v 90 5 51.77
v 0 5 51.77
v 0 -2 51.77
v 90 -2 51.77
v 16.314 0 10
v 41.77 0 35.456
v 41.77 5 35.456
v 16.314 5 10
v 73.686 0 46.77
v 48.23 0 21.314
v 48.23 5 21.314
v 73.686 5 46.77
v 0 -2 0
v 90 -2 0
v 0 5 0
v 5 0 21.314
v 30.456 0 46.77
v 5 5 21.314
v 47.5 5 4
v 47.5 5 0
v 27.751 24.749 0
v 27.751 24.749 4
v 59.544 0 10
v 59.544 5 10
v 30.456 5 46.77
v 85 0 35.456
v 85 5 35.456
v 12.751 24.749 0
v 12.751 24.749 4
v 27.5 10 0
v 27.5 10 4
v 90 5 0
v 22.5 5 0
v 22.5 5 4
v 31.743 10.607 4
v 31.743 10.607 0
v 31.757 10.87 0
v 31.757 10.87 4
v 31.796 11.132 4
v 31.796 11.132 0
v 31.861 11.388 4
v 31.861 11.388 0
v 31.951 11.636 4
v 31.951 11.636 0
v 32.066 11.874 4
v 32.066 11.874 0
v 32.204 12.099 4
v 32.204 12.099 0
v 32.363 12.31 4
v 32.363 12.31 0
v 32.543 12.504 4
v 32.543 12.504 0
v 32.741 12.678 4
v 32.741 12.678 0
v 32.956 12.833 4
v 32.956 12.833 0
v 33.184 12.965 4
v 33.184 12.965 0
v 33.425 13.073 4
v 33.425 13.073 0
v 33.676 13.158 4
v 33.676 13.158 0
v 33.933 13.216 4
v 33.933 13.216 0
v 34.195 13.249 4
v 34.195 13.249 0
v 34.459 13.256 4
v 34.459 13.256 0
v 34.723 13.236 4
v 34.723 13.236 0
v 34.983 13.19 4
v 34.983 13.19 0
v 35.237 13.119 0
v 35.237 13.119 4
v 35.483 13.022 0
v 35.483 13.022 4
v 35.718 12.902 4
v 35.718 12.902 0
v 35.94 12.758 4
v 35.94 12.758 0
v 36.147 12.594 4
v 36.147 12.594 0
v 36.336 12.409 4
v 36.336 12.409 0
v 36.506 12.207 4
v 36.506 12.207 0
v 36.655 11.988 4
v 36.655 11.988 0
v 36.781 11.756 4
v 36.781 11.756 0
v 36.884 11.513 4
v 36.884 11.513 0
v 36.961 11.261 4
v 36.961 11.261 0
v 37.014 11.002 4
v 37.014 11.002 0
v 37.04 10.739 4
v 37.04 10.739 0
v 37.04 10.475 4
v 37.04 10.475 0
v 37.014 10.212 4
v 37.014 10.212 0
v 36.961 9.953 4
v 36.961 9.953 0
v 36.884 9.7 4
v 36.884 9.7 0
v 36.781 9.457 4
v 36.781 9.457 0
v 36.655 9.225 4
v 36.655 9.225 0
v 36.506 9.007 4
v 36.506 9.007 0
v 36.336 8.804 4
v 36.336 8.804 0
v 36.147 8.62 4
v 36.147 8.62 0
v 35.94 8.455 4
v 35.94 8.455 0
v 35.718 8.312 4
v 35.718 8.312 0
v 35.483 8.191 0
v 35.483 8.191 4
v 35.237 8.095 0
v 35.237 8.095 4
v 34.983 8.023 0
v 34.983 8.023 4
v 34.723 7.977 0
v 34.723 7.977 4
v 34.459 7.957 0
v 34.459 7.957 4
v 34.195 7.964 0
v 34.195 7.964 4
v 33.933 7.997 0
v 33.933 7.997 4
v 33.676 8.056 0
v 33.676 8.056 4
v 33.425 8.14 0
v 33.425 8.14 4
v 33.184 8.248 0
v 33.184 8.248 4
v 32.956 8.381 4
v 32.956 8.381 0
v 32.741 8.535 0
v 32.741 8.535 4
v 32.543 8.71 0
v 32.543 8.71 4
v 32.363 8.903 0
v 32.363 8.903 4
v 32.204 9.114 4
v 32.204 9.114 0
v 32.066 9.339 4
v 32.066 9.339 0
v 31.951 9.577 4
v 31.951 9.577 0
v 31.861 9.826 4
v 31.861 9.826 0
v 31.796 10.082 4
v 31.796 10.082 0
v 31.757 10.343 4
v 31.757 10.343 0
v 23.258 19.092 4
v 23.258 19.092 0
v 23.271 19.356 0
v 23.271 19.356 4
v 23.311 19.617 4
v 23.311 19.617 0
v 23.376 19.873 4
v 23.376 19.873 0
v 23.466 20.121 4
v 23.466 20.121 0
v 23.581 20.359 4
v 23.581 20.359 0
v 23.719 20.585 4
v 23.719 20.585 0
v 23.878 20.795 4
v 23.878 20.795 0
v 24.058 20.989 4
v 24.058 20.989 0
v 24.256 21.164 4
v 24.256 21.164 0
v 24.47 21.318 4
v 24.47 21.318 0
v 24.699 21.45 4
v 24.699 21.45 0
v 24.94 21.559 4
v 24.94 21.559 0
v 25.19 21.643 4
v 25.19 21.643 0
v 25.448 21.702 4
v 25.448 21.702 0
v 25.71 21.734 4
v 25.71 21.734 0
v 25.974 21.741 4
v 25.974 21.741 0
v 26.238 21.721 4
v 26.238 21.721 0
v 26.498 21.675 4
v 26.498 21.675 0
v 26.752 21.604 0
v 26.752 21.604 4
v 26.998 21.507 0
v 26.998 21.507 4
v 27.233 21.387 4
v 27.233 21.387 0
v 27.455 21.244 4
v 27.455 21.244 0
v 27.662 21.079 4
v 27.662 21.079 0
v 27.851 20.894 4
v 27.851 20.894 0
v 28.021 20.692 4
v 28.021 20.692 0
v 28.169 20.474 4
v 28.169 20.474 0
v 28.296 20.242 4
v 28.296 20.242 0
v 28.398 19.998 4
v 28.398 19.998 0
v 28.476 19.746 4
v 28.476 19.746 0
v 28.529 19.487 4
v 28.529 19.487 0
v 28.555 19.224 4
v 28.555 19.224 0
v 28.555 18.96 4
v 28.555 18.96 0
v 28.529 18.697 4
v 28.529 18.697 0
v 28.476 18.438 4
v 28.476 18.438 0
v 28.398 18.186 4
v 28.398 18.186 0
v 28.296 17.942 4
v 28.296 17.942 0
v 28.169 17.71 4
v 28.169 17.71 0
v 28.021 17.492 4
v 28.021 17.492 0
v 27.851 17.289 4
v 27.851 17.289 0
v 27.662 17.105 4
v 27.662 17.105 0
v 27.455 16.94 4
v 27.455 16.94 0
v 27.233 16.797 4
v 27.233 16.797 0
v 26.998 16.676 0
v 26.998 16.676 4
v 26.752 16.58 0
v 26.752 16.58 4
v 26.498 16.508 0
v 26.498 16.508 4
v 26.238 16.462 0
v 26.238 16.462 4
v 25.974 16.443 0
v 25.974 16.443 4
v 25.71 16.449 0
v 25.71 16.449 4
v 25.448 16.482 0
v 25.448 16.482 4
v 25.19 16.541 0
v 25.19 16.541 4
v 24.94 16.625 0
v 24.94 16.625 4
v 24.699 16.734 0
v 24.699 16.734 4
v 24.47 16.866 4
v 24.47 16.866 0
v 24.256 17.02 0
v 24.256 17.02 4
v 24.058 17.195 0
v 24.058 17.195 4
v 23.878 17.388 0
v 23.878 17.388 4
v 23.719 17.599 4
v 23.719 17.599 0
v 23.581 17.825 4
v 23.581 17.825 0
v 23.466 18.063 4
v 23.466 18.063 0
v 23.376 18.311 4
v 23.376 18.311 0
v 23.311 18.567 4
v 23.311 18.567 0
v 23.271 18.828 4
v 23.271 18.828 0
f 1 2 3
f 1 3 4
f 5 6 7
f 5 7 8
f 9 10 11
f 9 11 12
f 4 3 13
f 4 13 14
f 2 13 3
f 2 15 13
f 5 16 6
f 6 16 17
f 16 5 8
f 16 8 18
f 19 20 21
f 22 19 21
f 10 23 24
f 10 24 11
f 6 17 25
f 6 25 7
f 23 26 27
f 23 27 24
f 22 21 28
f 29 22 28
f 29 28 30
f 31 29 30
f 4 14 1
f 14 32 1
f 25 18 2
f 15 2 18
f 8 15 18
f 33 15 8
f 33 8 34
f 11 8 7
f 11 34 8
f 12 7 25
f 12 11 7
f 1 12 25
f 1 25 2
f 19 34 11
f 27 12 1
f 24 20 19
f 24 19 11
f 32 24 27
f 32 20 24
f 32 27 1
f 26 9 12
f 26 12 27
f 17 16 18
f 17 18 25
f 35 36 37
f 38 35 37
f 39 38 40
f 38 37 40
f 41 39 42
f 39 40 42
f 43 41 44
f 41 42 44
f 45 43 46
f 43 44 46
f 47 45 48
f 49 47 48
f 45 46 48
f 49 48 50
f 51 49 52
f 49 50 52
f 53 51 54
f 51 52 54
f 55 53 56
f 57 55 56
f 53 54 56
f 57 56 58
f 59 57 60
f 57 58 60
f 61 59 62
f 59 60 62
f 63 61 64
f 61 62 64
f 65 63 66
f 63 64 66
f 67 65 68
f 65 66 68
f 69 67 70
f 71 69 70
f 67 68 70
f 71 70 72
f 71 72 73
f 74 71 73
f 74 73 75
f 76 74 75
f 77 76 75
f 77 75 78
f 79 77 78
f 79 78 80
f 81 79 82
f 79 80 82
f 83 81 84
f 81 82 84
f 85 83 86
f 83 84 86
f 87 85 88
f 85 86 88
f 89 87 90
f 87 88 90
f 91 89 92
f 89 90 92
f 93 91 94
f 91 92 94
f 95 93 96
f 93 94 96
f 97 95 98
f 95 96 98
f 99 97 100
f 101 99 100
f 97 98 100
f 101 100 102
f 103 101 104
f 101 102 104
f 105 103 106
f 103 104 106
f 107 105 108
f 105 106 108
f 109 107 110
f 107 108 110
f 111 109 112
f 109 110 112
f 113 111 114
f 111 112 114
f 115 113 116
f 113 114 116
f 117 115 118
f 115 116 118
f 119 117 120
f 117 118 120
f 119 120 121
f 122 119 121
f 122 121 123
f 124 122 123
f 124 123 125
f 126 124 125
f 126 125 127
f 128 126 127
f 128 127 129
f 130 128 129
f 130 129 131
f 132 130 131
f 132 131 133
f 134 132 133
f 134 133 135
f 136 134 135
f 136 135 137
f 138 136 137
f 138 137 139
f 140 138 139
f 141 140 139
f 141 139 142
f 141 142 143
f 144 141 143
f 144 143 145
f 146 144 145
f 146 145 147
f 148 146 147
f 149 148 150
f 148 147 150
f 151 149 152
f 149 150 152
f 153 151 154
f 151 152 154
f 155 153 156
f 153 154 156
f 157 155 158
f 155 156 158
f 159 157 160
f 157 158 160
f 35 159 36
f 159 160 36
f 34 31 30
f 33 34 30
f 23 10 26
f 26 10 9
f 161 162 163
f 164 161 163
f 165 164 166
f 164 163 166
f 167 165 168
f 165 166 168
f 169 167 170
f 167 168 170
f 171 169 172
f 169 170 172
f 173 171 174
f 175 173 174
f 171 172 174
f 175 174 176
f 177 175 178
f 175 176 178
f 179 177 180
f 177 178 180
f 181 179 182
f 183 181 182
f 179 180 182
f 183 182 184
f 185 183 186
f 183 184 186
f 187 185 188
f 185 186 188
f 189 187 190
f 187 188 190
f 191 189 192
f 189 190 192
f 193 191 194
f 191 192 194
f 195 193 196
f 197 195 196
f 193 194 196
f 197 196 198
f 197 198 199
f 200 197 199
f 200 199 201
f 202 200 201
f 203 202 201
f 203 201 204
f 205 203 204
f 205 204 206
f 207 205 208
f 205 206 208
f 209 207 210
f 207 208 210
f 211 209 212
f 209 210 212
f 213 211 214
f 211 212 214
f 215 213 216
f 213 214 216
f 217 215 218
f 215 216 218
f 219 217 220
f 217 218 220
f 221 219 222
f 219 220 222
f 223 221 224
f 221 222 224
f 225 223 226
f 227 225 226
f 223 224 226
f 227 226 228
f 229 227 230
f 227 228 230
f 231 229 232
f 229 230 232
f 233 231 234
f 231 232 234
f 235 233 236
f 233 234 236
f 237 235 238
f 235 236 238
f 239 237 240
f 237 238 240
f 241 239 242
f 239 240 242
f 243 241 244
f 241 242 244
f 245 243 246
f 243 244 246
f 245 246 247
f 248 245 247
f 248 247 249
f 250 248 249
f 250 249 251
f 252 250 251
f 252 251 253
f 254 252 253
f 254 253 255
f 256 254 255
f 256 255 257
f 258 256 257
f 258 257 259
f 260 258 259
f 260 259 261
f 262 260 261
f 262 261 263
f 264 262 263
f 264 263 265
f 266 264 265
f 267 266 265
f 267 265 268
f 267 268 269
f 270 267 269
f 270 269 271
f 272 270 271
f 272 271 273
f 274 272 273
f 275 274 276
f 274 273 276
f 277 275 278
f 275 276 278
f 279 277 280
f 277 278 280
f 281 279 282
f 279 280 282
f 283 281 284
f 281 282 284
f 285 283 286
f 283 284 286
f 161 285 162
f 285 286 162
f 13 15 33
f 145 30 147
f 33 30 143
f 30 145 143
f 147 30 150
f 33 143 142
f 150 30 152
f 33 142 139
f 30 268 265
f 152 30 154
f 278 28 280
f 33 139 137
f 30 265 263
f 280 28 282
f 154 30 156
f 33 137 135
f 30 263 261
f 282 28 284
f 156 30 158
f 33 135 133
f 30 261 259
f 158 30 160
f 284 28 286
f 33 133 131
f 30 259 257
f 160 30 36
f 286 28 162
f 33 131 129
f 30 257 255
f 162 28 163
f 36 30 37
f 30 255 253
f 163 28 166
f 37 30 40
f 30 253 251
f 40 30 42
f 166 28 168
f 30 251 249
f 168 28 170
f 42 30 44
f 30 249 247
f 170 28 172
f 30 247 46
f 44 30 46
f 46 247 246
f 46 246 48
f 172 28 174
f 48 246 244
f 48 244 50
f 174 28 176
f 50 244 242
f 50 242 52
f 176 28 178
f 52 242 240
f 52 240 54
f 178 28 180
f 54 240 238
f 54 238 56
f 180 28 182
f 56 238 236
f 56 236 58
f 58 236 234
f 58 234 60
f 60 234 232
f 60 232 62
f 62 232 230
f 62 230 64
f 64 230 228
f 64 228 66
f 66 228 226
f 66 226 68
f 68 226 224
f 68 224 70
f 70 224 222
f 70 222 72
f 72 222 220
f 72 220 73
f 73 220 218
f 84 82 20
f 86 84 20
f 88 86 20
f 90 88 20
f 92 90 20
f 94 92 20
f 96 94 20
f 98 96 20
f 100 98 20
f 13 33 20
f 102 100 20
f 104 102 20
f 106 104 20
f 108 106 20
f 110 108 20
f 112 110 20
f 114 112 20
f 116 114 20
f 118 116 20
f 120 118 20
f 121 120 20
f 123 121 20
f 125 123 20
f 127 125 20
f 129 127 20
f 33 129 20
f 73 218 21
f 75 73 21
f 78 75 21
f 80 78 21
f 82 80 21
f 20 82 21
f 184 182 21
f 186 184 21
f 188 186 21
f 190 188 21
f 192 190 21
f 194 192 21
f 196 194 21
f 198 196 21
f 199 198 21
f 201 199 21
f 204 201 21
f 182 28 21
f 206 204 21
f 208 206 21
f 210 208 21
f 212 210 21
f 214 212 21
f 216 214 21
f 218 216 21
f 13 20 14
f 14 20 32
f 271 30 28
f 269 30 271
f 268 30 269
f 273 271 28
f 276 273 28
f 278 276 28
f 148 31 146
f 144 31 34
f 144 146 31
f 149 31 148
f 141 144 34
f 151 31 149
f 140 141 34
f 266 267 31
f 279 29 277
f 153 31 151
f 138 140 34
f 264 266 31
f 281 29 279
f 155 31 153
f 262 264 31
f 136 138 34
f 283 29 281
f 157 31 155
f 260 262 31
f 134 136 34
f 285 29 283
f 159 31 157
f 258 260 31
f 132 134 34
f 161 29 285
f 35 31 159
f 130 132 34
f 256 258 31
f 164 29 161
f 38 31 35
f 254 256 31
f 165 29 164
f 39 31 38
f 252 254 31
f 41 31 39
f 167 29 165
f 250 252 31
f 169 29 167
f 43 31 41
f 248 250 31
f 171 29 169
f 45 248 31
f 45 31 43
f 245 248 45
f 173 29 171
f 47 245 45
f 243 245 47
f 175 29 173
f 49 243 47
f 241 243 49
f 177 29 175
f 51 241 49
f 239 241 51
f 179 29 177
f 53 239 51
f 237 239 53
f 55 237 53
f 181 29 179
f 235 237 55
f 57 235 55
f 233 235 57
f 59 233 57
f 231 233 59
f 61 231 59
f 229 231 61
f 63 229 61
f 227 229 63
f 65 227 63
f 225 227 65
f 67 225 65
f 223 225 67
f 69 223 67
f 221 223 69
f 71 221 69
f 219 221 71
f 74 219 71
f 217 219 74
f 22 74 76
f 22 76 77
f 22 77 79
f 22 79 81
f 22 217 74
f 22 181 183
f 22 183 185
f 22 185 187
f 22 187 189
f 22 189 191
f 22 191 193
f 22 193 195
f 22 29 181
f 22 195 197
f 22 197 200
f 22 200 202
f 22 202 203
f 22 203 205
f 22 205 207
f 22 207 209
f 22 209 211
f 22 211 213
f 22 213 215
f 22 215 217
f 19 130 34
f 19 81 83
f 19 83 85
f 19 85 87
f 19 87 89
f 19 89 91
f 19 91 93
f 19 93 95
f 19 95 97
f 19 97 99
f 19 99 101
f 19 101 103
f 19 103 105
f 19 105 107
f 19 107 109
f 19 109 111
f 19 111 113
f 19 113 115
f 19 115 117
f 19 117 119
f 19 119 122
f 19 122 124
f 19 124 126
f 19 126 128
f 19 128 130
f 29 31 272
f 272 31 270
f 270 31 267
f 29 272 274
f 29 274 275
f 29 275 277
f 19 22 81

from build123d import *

# Parameters (mm, degrees)
SKETCH1_W           = 90
SKETCH1_H           = 51.769552622
BOSS_EXTRUDE1_DEPTH = 5
SKETCH5_R           = 2.65
BOSS_EXTRUDE2_DEPTH = 4
CHAMFER1_SIZE       = 10
CHAMFER1_SIZE2      = 7.071067812
SKETCH6_W           = 90
SKETCH6_H           = 51.769552622
BOSS_EXTRUDE3_DEPTH = 2


with BuildPart() as part:
    # Sketch1 → Boss-Extrude1 (new body)
    with BuildSketch(Plane(origin=(0, 0, 0), x_dir=(1, 0, 0), z_dir=(0, 1, 0))):
        with Locations((45, -25.884776311)):
            Rectangle(SKETCH1_W, SKETCH1_H)
        Polygon((5, -21.313708499), (30.455844123, -46.769552622), (41.769552622, -35.455844123), (16.313708499, -10), align=None, mode=Mode.SUBTRACT)
        Polygon((48.230447378, -21.313708499), (73.686291501, -46.769552622), (85, -35.455844123), (59.544155877, -10), align=None, mode=Mode.SUBTRACT)
    extrude(amount=BOSS_EXTRUDE1_DEPTH)

    # Sketch5 → Boss-Extrude2 (add)
    with BuildSketch(Plane(origin=(0, 0, 0), x_dir=(-1, 0, 0), z_dir=(0, 0, -1))):
        Polygon((-52.5, 0), (-27.751262658, 24.748737342), (-12.751262658, 24.748737342), (-37.5, 0), align=None)
        with Locations((-25.908116908, 19.091883092)):
            Circle(SKETCH5_R, mode=Mode.SUBTRACT)
        with Locations((-34.393398282, 10.606601718)):
            Circle(SKETCH5_R, mode=Mode.SUBTRACT)
    extrude(amount=-BOSS_EXTRUDE2_DEPTH)

    # Chamfer1
    chamfer1_edges = [part.edges().sort_by_distance(p)[0] for p in [
        (32.5, 5, 2),
    ]]
    chamfer1_side = [part.faces().sort_by_distance(p)[0] for p in [
        (45.087025644, 5, 25.465047734),
    ]]
    chamfer(chamfer1_edges, length=CHAMFER1_SIZE, length2=CHAMFER1_SIZE2, reference=chamfer1_side[0])

    # Sketch6 → Boss-Extrude3 (add)
    with BuildSketch(Plane.XZ):
        with Locations((45, 25.884776311)):
            Rectangle(SKETCH6_W, SKETCH6_H)
    extrude(amount=BOSS_EXTRUDE3_DEPTH)


solid = part.part
